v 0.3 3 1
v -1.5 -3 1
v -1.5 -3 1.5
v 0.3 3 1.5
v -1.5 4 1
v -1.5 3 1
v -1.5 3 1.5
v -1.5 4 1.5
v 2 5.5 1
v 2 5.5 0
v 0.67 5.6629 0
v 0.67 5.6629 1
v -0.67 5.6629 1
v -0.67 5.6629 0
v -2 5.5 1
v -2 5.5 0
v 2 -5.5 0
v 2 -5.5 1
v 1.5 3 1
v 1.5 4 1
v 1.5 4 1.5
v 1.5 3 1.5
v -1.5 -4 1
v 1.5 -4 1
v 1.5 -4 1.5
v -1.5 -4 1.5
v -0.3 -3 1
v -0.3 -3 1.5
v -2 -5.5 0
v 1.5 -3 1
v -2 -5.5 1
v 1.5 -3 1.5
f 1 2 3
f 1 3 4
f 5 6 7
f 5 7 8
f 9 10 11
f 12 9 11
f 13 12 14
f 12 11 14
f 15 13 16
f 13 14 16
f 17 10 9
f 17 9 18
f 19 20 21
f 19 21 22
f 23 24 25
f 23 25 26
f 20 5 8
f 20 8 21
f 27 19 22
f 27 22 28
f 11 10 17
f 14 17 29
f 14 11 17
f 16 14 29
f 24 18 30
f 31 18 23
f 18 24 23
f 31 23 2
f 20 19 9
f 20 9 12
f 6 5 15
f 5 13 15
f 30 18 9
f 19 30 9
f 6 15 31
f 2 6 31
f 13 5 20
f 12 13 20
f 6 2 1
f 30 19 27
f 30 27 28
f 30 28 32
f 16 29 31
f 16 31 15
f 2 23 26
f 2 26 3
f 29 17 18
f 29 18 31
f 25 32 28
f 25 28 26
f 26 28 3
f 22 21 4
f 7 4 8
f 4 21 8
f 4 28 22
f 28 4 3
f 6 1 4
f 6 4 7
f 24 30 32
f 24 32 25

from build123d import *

# Parameters (mm, degrees)
PAD_DEPTH    = 1
PAD001_DEPTH = 0.5


with BuildPart() as part:
    # Sketch → Pad (new body)
    with BuildSketch(Plane.XY):
        with BuildLine():
            Line((2, 5.5), (2, -5.5))
            Line((2, -5.5), (-2, -5.5))
            Line((-2, -5.5), (-2, 5.5))
            ThreePointArc((2, 5.5), (0, 5.683346), (-2, 5.5))
        make_face()
    extrude(amount=PAD_DEPTH)

    # Sketch001 → Pad001 (new body)
    with BuildSketch(Plane.XY.offset(1)):
        Polygon((-1.5, 4), (1.5, 4), (1.5, 3), (-0.3, -3), (1.5, -3), (1.5, -4), (-1.5, -4), (-1.5, -3), (0.3, 3), (-1.5, 3), align=None)
    extrude(amount=PAD001_DEPTH)


solid = part.part
